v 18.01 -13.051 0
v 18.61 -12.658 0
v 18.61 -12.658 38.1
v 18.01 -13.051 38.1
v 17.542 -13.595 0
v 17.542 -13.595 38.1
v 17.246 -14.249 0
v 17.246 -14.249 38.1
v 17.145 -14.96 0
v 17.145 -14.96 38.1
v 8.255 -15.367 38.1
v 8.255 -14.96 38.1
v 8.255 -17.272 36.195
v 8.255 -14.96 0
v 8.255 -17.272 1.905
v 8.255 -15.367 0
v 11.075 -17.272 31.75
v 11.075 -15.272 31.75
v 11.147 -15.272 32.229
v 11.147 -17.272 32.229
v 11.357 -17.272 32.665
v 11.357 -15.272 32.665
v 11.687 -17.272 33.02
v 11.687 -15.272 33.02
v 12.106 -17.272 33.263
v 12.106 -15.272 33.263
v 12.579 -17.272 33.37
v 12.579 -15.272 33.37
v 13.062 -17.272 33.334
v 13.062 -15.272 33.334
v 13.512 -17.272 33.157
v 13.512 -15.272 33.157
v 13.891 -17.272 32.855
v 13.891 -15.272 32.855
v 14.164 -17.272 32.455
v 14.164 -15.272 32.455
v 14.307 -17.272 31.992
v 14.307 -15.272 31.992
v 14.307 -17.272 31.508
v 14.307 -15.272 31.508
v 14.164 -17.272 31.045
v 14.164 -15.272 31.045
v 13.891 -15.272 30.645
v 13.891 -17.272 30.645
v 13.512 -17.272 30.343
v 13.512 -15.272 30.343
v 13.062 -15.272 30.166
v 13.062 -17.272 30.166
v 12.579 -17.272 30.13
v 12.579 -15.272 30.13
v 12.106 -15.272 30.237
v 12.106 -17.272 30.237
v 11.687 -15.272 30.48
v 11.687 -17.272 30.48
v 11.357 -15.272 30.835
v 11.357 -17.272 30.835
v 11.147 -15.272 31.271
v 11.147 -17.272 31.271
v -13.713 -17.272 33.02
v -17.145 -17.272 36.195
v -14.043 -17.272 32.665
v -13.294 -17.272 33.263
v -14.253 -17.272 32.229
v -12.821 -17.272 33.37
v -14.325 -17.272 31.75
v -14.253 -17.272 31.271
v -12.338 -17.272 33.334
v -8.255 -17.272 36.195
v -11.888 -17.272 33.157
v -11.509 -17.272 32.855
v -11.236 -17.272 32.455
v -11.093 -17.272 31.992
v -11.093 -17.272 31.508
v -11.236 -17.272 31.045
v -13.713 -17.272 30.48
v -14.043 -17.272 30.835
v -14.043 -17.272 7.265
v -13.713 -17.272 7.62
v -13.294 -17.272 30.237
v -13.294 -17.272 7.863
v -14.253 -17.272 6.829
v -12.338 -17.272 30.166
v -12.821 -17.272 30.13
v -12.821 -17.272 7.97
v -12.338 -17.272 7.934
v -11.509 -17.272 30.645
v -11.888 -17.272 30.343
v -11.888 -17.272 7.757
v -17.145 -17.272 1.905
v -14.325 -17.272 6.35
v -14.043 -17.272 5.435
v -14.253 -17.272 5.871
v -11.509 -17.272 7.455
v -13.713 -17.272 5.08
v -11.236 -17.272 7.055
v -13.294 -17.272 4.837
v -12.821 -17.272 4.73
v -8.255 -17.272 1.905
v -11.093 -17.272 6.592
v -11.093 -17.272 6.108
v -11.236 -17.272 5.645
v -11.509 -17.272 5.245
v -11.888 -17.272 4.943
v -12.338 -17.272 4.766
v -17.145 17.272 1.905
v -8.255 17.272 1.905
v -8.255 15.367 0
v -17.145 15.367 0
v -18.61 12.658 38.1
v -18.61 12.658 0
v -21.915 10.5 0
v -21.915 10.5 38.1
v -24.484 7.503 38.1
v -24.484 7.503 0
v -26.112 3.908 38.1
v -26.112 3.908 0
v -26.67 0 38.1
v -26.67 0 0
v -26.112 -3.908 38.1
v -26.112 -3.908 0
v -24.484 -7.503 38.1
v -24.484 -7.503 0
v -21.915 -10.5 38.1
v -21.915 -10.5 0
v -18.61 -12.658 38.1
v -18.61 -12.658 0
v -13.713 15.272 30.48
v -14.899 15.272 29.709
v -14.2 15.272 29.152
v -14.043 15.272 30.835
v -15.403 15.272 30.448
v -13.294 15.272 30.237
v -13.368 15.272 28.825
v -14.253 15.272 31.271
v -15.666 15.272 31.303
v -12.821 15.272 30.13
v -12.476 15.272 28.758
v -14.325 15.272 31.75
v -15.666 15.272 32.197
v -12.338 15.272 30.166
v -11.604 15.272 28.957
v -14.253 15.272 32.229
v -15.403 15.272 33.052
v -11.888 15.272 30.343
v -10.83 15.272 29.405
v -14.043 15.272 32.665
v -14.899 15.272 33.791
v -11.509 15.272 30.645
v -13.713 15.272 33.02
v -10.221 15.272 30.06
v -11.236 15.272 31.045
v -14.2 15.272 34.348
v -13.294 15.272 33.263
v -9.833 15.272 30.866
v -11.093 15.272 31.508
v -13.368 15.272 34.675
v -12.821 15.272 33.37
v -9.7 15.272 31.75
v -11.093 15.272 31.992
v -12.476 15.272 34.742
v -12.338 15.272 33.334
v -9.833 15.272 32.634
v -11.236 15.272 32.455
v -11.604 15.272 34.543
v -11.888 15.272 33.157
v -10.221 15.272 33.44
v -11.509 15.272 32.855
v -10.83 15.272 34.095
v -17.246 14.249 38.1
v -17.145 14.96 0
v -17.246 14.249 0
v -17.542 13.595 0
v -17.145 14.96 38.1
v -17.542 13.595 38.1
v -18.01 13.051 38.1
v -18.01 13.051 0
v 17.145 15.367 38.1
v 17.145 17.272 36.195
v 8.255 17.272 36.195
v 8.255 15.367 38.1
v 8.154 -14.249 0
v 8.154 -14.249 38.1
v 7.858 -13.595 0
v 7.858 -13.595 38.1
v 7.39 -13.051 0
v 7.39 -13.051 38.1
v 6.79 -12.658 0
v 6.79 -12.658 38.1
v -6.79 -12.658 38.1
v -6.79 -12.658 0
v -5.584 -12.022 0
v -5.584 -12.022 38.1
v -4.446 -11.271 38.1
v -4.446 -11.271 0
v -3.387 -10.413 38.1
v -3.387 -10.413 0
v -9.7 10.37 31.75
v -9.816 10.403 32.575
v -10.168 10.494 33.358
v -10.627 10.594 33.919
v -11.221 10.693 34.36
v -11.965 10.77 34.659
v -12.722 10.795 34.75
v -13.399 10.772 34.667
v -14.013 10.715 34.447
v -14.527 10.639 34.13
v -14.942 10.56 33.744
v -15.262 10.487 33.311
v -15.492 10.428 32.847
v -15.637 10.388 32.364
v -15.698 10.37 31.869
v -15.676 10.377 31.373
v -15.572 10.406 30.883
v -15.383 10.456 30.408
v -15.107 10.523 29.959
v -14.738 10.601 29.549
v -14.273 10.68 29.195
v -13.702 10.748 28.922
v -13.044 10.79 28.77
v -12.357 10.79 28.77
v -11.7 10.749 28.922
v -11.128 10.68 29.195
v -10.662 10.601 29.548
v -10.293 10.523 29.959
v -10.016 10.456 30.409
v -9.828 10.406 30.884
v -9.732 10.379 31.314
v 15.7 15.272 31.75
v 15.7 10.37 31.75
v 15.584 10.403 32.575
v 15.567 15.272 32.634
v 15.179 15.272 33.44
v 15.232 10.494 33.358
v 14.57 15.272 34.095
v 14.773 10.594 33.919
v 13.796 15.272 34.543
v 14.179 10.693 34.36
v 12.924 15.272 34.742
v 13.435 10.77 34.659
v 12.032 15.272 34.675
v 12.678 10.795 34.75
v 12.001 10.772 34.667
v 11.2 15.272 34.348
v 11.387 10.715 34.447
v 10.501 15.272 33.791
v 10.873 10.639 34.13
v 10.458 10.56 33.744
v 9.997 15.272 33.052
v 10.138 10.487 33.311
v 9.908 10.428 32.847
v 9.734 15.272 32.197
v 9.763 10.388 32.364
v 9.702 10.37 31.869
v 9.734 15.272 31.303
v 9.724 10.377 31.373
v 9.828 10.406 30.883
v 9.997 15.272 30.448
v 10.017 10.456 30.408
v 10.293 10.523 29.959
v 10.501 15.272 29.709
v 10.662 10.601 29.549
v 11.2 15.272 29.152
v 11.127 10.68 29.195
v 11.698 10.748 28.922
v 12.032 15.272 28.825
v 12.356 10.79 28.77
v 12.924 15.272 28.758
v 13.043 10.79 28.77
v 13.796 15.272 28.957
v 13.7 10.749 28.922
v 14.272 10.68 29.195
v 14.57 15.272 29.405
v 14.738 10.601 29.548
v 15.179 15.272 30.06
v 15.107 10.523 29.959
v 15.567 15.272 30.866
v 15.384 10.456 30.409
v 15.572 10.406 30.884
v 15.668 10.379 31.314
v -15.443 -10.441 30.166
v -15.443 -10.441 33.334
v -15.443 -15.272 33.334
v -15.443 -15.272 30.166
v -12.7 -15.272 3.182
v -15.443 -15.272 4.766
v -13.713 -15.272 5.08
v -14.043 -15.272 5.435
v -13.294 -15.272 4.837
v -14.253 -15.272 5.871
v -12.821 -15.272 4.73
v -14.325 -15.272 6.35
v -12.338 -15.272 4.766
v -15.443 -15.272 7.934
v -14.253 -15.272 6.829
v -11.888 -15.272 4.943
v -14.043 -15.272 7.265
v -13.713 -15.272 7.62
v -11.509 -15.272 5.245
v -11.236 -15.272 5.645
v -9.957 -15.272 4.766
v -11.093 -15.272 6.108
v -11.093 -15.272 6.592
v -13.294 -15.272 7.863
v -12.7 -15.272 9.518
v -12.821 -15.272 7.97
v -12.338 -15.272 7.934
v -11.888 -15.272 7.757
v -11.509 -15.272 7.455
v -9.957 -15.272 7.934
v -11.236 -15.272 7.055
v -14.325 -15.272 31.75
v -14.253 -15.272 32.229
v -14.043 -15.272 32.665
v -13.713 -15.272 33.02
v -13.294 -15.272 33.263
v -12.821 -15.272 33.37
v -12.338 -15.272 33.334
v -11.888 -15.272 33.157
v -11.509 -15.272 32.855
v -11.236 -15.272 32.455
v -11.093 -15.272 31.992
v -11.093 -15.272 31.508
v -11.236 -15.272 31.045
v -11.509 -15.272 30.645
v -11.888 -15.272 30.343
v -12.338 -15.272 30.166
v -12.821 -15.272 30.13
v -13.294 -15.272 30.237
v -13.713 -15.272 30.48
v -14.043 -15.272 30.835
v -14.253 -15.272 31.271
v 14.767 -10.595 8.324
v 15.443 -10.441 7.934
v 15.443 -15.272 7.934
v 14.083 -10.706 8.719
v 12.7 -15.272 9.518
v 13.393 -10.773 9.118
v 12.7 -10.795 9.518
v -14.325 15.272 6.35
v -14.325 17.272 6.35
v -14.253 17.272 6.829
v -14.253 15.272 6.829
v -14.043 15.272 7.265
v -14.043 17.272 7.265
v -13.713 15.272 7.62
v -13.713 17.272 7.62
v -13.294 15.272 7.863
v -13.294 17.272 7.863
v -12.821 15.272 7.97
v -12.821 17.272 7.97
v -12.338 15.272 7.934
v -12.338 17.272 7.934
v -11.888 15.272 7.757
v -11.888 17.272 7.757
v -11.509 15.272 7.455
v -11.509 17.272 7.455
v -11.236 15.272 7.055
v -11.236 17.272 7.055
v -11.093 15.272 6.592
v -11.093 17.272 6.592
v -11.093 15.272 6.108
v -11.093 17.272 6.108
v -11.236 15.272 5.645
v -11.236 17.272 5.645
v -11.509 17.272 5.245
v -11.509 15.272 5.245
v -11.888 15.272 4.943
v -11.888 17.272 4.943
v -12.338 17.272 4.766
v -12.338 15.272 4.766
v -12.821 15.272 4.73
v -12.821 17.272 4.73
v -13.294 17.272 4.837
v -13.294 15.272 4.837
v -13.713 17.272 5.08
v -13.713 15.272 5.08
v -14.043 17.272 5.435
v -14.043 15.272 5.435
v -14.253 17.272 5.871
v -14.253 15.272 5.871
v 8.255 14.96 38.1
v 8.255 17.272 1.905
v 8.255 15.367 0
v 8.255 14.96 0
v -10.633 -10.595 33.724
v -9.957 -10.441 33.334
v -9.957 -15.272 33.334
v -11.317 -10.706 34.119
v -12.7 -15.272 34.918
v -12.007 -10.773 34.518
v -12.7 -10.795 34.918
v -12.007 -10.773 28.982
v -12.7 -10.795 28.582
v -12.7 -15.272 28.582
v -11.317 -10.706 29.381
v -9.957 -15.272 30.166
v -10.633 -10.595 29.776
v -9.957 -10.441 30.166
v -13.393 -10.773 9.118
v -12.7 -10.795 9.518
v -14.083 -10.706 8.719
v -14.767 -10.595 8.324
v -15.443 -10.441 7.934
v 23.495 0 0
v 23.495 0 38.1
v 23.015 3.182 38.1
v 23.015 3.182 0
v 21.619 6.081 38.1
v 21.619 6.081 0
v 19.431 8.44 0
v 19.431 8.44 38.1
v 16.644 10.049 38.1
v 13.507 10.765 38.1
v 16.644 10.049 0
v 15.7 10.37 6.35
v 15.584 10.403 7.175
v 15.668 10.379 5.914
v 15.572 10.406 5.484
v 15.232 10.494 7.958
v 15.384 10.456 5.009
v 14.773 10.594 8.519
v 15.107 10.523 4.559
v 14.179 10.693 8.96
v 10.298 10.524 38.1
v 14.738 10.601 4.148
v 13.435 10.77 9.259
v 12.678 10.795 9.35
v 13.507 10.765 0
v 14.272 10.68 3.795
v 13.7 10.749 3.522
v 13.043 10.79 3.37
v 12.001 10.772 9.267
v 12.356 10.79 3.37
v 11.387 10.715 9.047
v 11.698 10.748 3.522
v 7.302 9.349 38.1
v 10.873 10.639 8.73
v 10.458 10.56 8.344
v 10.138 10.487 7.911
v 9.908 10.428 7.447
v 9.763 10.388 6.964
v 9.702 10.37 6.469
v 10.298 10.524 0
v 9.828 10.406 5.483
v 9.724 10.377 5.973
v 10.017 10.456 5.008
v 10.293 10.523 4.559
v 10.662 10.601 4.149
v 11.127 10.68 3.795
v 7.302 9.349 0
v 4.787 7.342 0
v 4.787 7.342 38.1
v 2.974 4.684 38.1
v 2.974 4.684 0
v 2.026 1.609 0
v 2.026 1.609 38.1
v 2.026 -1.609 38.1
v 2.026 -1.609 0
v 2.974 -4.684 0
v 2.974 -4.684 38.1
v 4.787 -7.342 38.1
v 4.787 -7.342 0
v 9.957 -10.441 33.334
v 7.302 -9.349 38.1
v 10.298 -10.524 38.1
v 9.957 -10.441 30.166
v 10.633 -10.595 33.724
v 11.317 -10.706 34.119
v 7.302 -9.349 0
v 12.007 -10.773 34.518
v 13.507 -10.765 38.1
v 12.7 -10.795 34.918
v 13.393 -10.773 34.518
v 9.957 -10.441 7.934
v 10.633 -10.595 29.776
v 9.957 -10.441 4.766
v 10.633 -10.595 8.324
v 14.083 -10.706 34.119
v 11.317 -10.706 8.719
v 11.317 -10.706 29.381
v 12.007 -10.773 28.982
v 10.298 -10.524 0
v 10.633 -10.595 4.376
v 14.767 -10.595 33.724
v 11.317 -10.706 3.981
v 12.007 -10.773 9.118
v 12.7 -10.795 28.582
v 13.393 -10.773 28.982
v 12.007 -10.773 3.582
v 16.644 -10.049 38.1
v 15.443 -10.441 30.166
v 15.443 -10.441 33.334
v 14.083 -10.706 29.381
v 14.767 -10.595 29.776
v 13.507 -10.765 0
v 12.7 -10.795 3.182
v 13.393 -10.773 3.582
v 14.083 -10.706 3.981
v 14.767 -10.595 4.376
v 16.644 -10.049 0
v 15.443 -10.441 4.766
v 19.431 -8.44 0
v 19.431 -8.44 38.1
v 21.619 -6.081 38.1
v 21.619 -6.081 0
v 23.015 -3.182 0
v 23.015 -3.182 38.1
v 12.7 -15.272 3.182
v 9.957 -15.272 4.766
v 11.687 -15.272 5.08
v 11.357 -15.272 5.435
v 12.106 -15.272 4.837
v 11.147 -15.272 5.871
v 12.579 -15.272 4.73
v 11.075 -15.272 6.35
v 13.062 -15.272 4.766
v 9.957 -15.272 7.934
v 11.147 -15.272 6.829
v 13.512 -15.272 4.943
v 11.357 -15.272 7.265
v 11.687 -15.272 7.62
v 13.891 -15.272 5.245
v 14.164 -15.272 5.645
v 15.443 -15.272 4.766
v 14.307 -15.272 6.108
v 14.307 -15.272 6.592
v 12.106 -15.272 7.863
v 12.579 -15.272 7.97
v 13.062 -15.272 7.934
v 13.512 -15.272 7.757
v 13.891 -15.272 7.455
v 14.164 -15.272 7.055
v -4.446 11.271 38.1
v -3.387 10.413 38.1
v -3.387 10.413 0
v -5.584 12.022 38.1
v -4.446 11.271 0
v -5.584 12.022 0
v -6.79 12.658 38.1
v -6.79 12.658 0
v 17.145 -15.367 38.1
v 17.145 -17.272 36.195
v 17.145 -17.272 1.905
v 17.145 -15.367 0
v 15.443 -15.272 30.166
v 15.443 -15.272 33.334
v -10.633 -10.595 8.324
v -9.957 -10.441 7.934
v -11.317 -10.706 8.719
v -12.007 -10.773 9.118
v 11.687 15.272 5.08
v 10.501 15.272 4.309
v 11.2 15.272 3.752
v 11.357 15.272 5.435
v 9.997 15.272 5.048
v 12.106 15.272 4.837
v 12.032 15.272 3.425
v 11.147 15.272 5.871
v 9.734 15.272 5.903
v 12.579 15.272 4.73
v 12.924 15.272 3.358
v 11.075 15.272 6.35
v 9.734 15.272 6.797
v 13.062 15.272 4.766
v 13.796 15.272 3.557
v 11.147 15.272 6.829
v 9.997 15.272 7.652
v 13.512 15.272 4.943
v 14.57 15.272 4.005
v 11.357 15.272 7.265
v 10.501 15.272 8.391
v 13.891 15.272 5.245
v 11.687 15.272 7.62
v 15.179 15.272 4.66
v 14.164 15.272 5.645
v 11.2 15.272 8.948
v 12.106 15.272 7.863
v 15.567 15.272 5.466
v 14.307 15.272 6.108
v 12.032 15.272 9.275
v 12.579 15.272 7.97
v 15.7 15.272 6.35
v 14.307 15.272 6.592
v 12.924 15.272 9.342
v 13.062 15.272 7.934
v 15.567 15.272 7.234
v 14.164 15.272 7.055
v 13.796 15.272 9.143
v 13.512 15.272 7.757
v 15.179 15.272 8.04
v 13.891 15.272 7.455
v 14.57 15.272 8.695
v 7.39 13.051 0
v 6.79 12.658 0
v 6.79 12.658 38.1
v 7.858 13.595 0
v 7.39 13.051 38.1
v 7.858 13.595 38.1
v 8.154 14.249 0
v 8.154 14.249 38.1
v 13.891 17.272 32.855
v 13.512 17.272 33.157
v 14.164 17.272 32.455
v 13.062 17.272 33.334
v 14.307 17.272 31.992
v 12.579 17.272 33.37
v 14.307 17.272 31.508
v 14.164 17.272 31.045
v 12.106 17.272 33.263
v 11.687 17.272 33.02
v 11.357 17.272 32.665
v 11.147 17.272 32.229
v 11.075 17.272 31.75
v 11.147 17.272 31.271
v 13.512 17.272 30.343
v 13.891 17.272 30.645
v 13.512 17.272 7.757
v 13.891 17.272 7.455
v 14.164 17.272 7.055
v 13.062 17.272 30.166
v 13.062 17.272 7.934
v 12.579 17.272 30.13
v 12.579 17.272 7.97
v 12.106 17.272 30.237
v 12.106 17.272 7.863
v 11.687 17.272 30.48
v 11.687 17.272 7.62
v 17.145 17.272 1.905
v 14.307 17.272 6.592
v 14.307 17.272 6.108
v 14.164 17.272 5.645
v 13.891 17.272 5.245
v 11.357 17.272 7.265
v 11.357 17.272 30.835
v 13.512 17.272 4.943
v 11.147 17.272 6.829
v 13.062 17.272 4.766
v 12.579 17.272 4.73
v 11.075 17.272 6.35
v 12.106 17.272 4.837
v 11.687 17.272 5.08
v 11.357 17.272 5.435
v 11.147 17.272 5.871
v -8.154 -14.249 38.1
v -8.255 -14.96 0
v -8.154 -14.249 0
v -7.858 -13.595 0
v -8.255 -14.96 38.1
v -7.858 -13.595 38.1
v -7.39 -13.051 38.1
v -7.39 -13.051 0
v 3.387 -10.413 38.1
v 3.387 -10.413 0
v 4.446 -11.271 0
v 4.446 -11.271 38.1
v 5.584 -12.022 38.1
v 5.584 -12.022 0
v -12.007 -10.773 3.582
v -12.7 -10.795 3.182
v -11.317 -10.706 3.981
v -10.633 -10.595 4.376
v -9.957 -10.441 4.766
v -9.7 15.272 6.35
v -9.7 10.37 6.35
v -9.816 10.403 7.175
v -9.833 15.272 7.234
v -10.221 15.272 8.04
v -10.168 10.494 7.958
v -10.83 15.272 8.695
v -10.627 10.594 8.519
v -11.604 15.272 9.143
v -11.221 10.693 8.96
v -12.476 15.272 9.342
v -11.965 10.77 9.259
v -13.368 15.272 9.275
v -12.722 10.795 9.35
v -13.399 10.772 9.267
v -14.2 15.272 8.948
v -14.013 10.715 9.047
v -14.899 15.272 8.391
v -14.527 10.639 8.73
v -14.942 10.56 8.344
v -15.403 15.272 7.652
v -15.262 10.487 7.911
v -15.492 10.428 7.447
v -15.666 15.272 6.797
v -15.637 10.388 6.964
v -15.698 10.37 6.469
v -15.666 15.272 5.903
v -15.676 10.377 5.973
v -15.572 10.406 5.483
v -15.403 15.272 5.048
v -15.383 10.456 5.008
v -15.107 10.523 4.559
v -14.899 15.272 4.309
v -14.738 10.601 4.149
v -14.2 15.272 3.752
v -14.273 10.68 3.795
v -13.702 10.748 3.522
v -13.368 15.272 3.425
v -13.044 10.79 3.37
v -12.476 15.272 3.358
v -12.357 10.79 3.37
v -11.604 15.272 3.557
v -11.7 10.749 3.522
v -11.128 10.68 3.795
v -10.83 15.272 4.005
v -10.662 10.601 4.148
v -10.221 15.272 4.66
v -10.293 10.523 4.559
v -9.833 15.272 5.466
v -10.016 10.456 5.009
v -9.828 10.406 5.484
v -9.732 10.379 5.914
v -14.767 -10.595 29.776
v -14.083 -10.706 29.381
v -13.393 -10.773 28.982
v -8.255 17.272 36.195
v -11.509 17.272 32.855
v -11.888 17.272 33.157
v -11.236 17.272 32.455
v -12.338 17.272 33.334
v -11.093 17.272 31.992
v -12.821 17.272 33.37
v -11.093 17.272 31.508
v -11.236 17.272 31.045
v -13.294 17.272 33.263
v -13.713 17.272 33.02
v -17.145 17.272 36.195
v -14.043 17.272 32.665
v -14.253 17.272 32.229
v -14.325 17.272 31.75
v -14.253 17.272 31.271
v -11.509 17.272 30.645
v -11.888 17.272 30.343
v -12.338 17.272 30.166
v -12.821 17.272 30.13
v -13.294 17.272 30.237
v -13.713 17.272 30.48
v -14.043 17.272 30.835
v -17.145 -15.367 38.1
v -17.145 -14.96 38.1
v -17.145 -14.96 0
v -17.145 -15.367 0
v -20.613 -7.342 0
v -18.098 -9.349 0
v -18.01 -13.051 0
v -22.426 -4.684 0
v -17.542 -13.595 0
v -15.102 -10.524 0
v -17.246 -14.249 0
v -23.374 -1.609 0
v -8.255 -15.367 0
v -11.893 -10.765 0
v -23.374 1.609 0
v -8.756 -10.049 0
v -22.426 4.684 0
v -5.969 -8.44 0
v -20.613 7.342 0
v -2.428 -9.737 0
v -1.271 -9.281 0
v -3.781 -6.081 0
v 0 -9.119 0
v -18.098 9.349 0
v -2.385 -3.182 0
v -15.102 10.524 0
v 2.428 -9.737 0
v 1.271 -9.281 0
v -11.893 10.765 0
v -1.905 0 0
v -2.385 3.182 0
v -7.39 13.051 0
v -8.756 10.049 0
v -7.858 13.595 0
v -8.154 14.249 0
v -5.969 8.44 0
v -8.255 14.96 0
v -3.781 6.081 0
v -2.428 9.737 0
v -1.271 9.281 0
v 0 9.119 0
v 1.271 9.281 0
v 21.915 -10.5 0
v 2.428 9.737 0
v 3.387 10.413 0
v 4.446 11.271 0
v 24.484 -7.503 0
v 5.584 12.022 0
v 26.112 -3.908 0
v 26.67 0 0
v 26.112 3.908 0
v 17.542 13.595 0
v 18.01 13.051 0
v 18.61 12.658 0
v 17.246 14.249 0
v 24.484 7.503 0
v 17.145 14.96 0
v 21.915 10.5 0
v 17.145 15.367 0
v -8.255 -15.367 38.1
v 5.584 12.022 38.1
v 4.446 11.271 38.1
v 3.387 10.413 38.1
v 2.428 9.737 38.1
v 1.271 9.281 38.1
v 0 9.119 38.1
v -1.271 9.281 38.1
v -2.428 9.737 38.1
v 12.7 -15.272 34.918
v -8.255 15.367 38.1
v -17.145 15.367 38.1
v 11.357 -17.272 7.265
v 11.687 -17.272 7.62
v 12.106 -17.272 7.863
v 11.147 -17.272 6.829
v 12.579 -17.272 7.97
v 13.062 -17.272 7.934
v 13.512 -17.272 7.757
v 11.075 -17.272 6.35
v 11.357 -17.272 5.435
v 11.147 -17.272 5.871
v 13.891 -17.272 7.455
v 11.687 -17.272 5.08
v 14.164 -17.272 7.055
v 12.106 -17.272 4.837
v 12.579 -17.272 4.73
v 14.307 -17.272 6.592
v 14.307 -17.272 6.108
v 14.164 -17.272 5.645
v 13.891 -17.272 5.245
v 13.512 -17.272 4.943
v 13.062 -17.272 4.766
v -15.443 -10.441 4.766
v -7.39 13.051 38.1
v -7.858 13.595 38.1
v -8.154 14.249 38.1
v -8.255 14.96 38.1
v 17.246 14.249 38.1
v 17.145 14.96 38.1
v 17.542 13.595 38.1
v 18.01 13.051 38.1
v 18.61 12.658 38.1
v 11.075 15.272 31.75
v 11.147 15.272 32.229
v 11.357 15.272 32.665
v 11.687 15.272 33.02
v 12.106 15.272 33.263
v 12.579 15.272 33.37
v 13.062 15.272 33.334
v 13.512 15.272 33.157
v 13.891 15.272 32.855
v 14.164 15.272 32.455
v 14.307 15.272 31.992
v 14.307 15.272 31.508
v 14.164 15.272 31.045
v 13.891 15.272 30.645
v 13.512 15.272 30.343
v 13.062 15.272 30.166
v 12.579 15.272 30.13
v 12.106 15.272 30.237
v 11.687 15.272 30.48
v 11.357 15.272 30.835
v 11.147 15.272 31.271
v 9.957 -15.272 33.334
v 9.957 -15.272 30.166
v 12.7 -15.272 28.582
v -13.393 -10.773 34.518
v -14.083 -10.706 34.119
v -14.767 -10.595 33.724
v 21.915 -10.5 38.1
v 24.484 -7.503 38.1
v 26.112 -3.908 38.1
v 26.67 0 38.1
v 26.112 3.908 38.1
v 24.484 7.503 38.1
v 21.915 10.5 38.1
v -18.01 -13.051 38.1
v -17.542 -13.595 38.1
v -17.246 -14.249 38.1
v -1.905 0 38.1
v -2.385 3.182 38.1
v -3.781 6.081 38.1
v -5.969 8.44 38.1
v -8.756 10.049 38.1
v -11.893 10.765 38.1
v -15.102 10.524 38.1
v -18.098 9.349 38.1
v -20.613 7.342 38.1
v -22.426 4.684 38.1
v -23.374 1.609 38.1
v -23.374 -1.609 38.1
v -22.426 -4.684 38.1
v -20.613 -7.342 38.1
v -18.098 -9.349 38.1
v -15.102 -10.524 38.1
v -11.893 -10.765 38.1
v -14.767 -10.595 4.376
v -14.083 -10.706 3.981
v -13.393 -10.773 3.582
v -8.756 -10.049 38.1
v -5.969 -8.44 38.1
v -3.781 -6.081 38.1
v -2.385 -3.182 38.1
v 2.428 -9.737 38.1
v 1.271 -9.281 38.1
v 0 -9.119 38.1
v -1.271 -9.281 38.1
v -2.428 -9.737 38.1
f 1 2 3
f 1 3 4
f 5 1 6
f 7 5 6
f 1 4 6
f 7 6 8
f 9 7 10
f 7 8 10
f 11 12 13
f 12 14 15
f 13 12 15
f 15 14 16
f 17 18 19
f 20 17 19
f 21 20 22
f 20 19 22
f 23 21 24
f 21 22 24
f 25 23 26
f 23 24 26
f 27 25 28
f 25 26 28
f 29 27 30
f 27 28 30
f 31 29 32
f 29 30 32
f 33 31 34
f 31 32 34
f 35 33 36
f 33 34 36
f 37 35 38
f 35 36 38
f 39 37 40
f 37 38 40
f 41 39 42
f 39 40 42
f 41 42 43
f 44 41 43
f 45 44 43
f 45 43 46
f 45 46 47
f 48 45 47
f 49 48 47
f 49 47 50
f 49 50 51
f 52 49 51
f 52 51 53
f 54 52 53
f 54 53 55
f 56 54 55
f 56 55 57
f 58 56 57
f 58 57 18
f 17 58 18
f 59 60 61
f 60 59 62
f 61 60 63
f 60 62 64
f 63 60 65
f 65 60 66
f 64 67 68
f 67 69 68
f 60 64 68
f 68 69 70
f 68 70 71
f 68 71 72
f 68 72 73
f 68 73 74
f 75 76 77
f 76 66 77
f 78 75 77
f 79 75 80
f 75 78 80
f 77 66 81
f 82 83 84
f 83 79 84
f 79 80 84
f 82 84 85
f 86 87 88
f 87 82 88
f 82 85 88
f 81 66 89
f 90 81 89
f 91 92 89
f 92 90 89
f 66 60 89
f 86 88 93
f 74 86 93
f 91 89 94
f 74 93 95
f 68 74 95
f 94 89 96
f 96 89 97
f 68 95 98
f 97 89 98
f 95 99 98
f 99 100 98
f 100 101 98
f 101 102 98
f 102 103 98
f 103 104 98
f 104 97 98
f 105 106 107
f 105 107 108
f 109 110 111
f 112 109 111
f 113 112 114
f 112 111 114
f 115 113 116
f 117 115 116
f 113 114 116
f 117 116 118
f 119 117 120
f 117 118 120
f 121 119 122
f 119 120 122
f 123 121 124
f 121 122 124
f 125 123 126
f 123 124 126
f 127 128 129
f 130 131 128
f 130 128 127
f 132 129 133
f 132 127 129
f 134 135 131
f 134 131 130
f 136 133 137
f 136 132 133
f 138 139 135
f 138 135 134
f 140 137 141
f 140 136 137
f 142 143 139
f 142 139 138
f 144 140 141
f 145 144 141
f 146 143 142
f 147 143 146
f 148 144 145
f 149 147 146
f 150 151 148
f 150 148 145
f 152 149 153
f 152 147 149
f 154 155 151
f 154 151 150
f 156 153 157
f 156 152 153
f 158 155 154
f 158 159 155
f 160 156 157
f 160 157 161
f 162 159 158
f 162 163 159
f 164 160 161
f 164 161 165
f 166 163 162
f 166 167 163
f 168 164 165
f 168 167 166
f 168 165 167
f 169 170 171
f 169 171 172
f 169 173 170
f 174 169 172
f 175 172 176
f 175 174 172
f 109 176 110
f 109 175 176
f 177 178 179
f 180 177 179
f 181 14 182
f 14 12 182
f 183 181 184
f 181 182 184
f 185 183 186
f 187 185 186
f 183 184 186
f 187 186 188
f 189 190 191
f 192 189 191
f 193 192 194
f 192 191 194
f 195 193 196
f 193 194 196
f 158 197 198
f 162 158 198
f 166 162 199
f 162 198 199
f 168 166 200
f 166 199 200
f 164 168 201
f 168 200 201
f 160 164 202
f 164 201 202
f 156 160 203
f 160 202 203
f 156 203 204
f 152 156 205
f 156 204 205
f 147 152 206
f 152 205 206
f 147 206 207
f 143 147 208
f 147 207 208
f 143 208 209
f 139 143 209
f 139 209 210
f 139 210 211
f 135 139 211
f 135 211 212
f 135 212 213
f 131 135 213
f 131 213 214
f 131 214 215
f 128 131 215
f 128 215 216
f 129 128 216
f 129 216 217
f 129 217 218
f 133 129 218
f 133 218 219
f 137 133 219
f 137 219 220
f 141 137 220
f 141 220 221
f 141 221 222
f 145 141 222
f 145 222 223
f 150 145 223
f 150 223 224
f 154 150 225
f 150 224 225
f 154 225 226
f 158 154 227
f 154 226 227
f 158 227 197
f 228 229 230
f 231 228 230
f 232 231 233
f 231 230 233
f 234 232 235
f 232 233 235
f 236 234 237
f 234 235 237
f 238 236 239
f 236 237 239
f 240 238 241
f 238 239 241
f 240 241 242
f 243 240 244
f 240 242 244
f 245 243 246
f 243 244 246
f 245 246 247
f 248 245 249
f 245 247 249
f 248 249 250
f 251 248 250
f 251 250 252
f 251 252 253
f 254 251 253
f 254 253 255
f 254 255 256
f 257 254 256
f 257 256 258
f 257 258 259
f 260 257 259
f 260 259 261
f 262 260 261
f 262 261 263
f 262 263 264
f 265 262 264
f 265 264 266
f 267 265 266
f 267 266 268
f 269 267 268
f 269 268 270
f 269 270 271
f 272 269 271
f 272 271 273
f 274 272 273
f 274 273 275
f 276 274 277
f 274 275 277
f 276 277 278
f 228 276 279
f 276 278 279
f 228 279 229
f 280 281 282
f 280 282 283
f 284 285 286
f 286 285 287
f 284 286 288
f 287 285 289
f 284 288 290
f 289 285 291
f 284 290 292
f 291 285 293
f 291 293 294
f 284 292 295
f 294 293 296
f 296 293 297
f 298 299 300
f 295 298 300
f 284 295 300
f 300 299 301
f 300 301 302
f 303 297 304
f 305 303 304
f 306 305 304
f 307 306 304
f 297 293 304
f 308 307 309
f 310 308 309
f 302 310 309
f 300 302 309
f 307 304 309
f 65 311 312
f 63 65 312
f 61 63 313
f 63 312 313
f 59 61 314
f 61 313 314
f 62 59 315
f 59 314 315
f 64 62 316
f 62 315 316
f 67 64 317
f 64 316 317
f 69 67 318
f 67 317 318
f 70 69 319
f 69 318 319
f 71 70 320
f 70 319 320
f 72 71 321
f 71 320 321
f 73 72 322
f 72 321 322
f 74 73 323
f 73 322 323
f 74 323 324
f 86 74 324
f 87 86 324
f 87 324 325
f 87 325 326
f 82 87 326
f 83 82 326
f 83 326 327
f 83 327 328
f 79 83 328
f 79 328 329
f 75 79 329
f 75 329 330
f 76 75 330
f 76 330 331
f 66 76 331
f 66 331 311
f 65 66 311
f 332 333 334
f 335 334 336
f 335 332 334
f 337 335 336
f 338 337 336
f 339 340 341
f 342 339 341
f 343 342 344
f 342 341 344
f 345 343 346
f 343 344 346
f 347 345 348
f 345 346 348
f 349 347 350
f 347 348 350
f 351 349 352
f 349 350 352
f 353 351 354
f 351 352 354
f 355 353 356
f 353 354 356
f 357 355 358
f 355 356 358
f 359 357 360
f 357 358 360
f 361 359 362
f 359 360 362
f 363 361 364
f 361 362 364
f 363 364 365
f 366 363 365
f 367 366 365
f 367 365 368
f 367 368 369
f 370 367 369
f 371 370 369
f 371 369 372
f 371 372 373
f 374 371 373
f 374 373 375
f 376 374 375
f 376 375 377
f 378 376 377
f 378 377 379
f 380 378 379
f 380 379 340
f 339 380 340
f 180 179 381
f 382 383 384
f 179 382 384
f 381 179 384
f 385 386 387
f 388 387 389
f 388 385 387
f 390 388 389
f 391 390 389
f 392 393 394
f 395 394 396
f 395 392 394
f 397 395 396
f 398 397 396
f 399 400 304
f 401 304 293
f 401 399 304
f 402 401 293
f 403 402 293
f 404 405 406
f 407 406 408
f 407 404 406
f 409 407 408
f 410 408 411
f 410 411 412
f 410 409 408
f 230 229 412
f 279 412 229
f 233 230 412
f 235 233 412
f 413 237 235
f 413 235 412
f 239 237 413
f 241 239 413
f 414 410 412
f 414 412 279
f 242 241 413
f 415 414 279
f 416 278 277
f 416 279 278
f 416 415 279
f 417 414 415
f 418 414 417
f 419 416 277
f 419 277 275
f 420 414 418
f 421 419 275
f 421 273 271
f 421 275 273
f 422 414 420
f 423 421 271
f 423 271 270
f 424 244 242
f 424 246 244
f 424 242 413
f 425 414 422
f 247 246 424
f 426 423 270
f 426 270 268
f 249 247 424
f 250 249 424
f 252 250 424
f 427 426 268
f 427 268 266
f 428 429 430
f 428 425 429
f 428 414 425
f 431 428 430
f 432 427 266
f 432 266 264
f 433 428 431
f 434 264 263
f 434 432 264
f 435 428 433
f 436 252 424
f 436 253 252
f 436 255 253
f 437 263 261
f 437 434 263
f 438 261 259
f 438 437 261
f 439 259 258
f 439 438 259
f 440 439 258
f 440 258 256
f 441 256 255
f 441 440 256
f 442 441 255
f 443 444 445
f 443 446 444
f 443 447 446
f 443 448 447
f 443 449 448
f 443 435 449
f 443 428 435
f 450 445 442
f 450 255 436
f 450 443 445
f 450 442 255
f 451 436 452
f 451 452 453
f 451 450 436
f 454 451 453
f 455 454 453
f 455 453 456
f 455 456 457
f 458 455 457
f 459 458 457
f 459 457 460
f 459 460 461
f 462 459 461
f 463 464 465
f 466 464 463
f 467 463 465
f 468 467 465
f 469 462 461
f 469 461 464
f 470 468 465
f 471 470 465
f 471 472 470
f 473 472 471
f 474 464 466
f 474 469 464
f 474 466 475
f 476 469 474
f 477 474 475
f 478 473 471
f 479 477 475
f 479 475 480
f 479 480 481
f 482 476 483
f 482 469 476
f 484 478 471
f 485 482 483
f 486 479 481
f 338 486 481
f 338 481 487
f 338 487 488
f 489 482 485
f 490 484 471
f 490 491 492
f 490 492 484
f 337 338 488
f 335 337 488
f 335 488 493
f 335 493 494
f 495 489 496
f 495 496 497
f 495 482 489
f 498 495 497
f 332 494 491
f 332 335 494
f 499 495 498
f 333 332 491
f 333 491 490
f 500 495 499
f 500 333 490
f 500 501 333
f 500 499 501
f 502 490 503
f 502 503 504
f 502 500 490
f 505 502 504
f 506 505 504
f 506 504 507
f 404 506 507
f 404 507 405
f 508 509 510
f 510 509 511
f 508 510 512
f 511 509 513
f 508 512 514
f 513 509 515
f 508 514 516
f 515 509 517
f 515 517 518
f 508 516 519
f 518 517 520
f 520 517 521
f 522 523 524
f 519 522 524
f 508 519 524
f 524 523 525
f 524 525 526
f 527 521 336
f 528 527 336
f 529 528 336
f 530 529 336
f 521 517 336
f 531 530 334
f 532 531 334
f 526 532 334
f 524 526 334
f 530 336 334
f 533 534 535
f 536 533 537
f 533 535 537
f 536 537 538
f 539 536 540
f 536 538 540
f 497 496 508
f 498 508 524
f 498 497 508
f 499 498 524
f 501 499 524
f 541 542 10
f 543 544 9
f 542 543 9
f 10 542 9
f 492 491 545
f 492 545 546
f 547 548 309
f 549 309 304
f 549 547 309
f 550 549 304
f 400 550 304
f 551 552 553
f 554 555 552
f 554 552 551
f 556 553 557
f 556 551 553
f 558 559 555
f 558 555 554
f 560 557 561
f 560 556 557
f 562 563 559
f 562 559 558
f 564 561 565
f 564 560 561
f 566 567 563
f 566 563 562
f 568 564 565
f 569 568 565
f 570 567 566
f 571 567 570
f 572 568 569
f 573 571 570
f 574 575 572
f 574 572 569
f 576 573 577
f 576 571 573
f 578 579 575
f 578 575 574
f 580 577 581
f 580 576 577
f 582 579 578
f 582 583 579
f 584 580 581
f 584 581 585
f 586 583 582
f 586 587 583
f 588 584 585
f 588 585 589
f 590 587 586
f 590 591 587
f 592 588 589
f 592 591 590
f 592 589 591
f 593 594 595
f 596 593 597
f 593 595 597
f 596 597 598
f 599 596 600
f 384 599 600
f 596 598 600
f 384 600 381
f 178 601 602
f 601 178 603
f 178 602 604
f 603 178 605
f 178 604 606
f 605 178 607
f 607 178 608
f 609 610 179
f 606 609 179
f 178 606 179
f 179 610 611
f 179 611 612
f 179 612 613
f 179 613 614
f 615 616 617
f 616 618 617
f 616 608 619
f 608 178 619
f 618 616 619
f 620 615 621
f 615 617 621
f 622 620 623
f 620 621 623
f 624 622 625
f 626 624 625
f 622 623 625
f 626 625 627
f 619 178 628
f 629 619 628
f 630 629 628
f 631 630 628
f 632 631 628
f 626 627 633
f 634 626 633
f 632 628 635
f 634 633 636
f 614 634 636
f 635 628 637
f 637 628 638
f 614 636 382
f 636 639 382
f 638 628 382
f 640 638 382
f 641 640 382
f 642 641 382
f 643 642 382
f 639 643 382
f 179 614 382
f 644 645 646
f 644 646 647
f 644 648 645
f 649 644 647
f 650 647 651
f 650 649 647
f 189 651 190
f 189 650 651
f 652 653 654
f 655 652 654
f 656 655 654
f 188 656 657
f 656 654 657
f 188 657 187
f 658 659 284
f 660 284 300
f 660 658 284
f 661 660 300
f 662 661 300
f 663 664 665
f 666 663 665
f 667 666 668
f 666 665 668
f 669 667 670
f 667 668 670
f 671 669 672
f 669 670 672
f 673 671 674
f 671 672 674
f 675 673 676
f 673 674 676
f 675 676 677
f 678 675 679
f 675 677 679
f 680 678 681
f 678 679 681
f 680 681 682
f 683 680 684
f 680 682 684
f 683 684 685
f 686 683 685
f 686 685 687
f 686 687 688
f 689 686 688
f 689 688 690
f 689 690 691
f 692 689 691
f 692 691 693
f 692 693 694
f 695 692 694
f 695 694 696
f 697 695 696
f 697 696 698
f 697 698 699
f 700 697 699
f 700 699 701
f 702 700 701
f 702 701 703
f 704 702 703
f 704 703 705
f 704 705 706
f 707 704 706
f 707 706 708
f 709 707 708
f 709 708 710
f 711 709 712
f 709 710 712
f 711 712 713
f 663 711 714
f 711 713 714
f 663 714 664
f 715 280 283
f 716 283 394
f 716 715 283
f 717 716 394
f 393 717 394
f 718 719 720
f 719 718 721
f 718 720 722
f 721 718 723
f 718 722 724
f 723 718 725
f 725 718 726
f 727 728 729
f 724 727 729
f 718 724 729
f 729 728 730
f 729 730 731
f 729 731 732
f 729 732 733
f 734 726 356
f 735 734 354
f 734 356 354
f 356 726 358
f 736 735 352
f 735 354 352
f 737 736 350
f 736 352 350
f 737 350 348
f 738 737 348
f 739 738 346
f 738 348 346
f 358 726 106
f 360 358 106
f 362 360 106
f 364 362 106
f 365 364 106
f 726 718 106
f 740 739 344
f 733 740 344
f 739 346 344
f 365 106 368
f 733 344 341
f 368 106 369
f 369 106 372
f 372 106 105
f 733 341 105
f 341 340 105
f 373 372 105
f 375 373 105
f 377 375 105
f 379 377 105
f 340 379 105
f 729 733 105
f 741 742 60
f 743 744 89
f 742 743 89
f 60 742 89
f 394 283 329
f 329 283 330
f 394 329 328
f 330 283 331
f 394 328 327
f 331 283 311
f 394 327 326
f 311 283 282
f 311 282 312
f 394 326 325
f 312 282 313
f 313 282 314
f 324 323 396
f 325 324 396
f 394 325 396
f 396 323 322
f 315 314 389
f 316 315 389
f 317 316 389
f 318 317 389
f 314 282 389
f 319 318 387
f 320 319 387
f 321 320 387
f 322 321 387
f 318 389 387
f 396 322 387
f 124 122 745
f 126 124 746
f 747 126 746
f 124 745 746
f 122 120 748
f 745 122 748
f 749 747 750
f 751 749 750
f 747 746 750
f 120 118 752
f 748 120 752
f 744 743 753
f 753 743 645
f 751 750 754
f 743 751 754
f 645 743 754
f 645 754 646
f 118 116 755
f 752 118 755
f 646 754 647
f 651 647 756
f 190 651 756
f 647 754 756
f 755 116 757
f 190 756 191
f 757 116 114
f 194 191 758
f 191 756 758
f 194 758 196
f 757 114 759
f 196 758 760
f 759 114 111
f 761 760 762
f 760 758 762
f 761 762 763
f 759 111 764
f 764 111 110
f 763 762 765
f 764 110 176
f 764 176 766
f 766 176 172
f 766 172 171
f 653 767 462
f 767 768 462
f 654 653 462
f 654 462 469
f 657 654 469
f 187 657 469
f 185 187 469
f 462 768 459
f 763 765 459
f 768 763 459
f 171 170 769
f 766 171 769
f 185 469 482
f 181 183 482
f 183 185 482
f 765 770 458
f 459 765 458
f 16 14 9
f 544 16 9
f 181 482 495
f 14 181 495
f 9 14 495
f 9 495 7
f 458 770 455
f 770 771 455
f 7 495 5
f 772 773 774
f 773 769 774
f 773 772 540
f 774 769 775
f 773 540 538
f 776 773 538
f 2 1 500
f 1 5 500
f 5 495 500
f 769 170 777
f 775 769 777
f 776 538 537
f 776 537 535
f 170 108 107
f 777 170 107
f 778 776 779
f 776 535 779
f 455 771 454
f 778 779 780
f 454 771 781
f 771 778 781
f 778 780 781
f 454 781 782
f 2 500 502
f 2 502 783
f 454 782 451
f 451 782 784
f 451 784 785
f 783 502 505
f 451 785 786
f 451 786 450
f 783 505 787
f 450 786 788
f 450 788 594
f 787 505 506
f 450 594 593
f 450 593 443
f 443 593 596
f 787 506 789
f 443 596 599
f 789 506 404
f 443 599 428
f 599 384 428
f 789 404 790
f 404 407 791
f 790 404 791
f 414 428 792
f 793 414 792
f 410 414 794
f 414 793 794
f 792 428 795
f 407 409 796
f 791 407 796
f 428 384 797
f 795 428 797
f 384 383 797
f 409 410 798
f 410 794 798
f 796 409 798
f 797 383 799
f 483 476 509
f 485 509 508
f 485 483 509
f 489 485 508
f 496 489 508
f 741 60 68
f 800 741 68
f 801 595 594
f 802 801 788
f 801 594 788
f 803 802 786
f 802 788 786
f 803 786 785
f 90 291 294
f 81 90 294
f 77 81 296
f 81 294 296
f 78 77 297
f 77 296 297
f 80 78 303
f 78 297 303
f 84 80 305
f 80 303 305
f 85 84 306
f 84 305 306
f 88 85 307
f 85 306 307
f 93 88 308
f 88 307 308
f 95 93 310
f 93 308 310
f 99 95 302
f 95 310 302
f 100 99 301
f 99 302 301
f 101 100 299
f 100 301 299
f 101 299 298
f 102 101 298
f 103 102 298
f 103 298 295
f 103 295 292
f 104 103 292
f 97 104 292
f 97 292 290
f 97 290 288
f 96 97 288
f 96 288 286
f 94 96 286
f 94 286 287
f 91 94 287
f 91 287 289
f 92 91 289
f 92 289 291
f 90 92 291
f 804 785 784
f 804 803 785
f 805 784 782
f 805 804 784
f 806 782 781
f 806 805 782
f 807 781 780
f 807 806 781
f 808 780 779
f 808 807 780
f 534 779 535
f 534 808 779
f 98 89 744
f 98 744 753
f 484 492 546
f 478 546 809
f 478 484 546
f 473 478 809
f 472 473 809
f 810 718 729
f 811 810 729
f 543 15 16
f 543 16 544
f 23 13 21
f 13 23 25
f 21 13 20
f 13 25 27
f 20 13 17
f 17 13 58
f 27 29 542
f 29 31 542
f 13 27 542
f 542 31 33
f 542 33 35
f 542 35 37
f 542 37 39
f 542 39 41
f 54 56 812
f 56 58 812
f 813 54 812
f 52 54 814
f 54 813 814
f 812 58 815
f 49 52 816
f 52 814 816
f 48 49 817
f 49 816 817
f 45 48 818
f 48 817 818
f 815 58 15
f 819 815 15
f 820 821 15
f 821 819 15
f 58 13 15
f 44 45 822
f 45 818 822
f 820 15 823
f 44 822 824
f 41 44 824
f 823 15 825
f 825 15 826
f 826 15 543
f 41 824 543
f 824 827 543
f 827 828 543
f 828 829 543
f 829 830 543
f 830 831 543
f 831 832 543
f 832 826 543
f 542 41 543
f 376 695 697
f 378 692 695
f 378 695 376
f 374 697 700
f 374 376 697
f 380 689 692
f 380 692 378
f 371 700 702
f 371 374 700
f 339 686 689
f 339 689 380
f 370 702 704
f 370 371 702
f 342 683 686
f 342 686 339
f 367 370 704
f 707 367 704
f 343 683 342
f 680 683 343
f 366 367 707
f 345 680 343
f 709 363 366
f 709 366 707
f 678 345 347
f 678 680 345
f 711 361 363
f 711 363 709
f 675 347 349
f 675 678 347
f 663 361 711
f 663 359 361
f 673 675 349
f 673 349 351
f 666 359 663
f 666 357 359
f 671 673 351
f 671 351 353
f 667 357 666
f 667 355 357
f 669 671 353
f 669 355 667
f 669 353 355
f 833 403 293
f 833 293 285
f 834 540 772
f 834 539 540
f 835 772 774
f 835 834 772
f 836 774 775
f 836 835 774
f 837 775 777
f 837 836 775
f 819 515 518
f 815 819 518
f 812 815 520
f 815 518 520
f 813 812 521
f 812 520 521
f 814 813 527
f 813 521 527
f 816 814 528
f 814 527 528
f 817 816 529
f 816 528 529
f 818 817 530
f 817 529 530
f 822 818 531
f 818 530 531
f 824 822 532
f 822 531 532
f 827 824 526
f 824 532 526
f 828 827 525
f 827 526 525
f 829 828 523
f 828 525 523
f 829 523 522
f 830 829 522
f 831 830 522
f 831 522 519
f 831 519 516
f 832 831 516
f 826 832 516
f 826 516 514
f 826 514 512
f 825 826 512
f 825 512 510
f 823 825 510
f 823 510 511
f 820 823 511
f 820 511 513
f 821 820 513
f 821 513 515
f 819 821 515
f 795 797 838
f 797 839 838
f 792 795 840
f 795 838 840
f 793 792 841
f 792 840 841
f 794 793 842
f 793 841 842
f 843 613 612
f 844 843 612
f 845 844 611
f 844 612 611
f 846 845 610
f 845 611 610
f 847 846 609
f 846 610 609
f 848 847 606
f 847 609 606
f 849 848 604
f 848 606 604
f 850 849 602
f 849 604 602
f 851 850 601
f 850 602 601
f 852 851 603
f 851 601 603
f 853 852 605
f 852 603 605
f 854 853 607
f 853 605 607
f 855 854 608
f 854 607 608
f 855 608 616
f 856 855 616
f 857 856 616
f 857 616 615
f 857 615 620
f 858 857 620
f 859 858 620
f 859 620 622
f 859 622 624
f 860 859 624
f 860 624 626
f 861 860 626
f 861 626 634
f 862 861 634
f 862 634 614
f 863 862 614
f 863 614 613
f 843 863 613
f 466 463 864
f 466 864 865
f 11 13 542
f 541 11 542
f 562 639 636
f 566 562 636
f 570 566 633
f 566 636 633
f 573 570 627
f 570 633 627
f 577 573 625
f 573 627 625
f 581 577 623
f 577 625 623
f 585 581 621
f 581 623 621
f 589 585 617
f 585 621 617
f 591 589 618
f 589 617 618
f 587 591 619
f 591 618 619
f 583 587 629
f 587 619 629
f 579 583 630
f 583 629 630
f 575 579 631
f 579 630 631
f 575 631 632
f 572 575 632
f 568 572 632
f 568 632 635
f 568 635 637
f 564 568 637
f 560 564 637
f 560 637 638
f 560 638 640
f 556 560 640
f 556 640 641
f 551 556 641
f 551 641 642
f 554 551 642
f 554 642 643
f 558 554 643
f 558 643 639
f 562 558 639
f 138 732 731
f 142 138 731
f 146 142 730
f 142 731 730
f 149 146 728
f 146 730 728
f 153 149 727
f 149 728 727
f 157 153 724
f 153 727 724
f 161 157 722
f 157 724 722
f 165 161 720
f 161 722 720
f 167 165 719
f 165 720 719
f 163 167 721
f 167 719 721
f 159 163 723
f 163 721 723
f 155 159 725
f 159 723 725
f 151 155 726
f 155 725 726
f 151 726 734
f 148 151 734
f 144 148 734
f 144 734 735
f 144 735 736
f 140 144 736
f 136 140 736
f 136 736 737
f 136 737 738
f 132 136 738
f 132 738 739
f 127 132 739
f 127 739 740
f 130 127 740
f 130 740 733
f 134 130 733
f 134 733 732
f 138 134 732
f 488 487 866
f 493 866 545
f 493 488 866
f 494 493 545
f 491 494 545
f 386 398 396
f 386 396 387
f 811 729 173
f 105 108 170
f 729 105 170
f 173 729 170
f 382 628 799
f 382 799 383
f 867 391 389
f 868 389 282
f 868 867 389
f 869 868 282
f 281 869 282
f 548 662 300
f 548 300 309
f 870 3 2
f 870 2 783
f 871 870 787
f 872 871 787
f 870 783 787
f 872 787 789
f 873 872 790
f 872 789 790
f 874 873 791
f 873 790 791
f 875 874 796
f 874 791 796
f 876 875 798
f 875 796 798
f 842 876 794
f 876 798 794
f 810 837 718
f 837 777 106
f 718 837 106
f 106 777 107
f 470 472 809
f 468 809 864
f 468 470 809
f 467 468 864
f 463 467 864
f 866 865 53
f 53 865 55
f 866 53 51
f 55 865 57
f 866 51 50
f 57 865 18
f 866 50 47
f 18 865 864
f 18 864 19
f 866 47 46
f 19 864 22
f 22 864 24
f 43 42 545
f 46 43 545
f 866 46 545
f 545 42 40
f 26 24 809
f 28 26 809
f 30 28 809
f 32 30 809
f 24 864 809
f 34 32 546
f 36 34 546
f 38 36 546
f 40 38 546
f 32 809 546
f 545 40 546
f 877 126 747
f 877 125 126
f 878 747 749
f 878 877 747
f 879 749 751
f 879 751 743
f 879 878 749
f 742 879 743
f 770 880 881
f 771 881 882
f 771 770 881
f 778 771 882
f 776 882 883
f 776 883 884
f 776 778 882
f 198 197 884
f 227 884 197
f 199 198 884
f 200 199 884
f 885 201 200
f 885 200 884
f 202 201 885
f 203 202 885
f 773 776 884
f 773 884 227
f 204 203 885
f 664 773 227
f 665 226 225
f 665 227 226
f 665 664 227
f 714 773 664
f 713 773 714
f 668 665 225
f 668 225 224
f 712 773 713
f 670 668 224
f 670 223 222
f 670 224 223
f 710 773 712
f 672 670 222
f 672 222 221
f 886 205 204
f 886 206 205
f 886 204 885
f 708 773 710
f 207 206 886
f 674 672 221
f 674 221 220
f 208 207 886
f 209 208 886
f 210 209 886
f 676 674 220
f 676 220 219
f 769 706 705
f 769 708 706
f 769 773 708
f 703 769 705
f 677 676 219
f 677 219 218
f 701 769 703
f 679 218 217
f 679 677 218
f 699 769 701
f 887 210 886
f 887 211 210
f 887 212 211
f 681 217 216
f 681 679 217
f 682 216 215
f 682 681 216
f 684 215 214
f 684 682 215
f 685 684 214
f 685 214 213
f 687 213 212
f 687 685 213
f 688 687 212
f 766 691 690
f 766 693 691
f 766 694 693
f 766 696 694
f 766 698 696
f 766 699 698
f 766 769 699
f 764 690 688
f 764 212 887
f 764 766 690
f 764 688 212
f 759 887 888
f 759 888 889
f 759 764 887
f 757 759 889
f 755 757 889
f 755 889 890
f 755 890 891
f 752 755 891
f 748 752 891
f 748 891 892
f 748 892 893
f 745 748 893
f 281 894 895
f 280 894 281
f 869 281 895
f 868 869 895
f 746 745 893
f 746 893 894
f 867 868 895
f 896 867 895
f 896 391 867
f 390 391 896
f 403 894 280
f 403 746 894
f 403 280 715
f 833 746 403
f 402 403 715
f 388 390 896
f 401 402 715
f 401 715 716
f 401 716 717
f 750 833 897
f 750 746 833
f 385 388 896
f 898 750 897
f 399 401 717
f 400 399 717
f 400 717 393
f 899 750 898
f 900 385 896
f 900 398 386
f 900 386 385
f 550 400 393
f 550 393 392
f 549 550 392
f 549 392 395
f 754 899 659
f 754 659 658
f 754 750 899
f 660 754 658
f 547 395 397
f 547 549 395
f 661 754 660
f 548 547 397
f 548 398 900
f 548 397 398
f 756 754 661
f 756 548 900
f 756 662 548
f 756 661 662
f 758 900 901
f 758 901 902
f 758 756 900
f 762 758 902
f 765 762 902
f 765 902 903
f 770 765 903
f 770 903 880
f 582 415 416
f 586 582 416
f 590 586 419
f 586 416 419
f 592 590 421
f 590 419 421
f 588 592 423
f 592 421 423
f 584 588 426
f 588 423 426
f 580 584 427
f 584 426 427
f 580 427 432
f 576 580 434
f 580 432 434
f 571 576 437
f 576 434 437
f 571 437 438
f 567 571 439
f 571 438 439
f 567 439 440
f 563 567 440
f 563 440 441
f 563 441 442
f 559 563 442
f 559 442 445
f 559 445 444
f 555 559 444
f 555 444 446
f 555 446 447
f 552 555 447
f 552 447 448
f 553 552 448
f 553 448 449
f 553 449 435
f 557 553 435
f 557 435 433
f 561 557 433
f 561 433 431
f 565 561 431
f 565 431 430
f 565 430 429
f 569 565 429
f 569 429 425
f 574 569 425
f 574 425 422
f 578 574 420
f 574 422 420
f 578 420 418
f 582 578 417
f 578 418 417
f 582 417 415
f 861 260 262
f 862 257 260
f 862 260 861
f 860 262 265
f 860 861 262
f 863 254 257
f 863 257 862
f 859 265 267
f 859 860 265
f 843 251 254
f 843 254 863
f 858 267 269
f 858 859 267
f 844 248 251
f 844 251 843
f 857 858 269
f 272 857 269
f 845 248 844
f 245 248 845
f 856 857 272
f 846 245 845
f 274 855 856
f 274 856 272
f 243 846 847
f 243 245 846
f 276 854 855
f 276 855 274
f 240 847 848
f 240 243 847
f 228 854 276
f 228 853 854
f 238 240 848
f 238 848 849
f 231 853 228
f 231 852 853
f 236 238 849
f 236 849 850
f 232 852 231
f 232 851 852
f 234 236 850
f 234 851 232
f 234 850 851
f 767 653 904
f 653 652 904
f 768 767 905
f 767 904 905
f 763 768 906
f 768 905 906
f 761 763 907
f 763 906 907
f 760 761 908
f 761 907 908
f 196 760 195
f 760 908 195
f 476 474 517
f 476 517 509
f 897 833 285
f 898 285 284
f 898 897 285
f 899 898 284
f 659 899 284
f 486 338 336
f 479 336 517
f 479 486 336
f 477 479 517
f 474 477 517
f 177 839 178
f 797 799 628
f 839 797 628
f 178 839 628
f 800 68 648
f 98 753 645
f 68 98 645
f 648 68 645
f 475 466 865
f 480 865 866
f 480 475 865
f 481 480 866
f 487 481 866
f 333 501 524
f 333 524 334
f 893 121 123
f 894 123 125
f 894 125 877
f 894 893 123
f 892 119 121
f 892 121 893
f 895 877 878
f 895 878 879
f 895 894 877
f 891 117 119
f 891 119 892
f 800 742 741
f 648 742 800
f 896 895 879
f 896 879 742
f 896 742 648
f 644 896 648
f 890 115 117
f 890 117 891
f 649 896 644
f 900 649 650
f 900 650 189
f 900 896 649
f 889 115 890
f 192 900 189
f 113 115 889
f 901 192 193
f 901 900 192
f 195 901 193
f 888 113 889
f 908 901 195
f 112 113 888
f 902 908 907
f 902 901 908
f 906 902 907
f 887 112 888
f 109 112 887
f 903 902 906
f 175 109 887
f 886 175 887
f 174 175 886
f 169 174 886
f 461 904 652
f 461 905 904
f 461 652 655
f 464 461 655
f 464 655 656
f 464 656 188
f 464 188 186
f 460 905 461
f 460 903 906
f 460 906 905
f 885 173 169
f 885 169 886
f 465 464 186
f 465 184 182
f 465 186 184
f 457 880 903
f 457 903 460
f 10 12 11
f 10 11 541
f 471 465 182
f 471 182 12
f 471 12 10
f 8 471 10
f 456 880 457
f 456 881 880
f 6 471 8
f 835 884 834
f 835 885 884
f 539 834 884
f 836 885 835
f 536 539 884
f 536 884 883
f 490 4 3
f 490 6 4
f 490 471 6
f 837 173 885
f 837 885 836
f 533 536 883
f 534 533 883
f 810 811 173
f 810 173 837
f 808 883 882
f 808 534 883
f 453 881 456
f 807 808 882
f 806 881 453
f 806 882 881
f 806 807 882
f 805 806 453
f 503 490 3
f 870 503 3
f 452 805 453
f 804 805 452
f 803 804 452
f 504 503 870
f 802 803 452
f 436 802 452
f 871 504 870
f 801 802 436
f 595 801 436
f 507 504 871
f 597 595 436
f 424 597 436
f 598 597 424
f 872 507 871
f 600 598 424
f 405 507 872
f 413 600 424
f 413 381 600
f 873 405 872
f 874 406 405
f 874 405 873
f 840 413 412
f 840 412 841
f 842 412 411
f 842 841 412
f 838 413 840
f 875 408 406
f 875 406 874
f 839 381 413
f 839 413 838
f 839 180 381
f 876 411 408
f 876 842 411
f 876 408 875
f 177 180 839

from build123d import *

# Parameters (mm, degrees)
F0_R     = 10.795
F1_DEPTH = 38.1
F3_D     = 3.25
F4_R     = 3
F5_DEPTH = 15.272
F7_DEPTH = 15.272
F8_SIZE  = 1.905
F9_R     = 5.08
F10_R    = 2.54


with BuildPart() as f1:
    # F0 (on Top) → F1 (new body)
    with BuildSketch(Plane.XY):
        with BuildLine():
            ThreePointArc((8.255, 13.2439750453), (3.3583146073, 10.3871947138), (0, 5.8198711326))
            ThreePointArc((0, 5.8198711326), (-3.3583146073, 10.3871947138), (-8.255, 13.2439750453))
            Line((-8.255, 13.2439750453), (-8.255, 17.272))
            Line((-8.255, 17.272), (-17.145, 17.272))
            Line((-17.145, 17.272), (-17.145, 13.2439750453))
            ThreePointArc((-17.145, 13.2439750453), (-26.67, 0), (-17.145, -13.2439750453))
            Line((-17.145, -13.2439750453), (-17.145, -17.272))
            Line((-17.145, -17.272), (-8.255, -17.272))
            Line((-8.255, -17.272), (-8.255, -13.2439750453))
            ThreePointArc((-8.255, -13.2439750453), (-3.3583146073, -10.3871947138), (0, -5.8198711326))
            ThreePointArc((0, -5.8198711326), (3.3583146073, -10.3871947138), (8.255, -13.2439750453))
            Line((8.255, -13.2439750453), (8.255, -17.272))
            Line((8.255, -17.272), (17.145, -17.272))
            Line((17.145, -17.272), (17.145, -13.2439750453))
            ThreePointArc((17.145, -13.2439750453), (26.67, 0), (17.145, 13.2439750453))
            Line((17.145, 13.2439750453), (17.145, 17.272))
            Line((17.145, 17.272), (8.255, 17.272))
            Line((8.255, 17.272), (8.255, 13.2439750453))
        make_face()
        with Locations((-12.7, 0)):
            Circle(F0_R, mode=Mode.SUBTRACT)
        with Locations((12.7, 0)):
            Circle(F0_R, mode=Mode.SUBTRACT)
    extrude(amount=F1_DEPTH)

    # F3 (through all)
    with Locations(Plane.XZ.offset(17.272)):
        with Locations((-12.7, 31.75), (12.7, 31.75), (12.7, 6.35), (-12.7, 6.35)):
            Hole(F3_D / 2)

    # F4 (on Front) → F5 (cut, through all)
    with BuildSketch(Plane.XZ):
        with Locations((-12.7, 31.75)):
            Circle(F4_R)
        with Locations((-12.7, 6.35)):
            Circle(F4_R)
        with Locations((12.7, 6.35)):
            Circle(F4_R)
        with Locations((12.7, 31.75)):
            Circle(F4_R)
    extrude(amount=-F5_DEPTH, mode=Mode.SUBTRACT)

    # F6 (on Front) → F7 (cut, through all)
    with BuildSketch(Plane.XZ):
        Polygon((-9.9568, 30.1662127416), (-9.9568, 33.3337872584), (-12.7, 34.9175745169), (-15.4432, 33.3337872584), (-15.4432, 30.1662127416), (-12.7, 28.5824254831), align=None)
        Polygon((-9.9568, 4.7662127416), (-9.9568, 7.9337872584), (-12.7, 9.5175745169), (-15.4432, 7.9337872584), (-15.4432, 4.7662127416), (-12.7, 3.1824254831), align=None)
        Polygon((15.4432, 4.7662127416), (15.4432, 7.9337872584), (12.7, 9.5175745169), (9.9568, 7.9337872584), (9.9568, 4.7662127416), (12.7, 3.1824254831), align=None)
        Polygon((15.4432, 30.1662127416), (15.4432, 33.3337872584), (12.7, 34.9175745169), (9.9568, 33.3337872584), (9.9568, 30.1662127416), (12.7, 28.5824254831), align=None)
    extrude(amount=F7_DEPTH, mode=Mode.SUBTRACT)

    # F8
    f8_edges = [f1.edges().sort_by_distance(p)[0] for p in [
        (12.7, -17.272, 38.1),
        (12.7, -17.272, 0),
        (-12.7, -17.272, 0),
        (-12.7, -17.272, 38.1),
        (12.7, 17.272, 38.1),
        (12.7, 17.272, 0),
        (-12.7, 17.272, 0),
        (-12.7, 17.272, 38.1),
    ]]
    chamfer(f8_edges, length=F8_SIZE)

    # F9
    f9_edges = [f1.edges().sort_by_distance(p)[0] for p in [
        (0, 5.819871, 19.05),
        (0, -5.819871, 19.05),
    ]]
    fillet(f9_edges, radius=F9_R)

    # F10
    f10_edges = [f1.edges().sort_by_distance(p)[0] for p in [
        (-8.255, -13.243975, 19.05),
        (8.255, -13.243975, 19.05),
        (17.145, -13.243975, 19.05),
        (17.145, 13.243975, 19.05),
        (8.255, 13.243975, 19.05),
        (-17.145, 13.243975, 19.05),
        (-8.255, 13.243975, 19.05),
        (-17.145, -13.243975, 19.05),
    ]]
    fillet(f10_edges, radius=F10_R)


solid = f1.part
